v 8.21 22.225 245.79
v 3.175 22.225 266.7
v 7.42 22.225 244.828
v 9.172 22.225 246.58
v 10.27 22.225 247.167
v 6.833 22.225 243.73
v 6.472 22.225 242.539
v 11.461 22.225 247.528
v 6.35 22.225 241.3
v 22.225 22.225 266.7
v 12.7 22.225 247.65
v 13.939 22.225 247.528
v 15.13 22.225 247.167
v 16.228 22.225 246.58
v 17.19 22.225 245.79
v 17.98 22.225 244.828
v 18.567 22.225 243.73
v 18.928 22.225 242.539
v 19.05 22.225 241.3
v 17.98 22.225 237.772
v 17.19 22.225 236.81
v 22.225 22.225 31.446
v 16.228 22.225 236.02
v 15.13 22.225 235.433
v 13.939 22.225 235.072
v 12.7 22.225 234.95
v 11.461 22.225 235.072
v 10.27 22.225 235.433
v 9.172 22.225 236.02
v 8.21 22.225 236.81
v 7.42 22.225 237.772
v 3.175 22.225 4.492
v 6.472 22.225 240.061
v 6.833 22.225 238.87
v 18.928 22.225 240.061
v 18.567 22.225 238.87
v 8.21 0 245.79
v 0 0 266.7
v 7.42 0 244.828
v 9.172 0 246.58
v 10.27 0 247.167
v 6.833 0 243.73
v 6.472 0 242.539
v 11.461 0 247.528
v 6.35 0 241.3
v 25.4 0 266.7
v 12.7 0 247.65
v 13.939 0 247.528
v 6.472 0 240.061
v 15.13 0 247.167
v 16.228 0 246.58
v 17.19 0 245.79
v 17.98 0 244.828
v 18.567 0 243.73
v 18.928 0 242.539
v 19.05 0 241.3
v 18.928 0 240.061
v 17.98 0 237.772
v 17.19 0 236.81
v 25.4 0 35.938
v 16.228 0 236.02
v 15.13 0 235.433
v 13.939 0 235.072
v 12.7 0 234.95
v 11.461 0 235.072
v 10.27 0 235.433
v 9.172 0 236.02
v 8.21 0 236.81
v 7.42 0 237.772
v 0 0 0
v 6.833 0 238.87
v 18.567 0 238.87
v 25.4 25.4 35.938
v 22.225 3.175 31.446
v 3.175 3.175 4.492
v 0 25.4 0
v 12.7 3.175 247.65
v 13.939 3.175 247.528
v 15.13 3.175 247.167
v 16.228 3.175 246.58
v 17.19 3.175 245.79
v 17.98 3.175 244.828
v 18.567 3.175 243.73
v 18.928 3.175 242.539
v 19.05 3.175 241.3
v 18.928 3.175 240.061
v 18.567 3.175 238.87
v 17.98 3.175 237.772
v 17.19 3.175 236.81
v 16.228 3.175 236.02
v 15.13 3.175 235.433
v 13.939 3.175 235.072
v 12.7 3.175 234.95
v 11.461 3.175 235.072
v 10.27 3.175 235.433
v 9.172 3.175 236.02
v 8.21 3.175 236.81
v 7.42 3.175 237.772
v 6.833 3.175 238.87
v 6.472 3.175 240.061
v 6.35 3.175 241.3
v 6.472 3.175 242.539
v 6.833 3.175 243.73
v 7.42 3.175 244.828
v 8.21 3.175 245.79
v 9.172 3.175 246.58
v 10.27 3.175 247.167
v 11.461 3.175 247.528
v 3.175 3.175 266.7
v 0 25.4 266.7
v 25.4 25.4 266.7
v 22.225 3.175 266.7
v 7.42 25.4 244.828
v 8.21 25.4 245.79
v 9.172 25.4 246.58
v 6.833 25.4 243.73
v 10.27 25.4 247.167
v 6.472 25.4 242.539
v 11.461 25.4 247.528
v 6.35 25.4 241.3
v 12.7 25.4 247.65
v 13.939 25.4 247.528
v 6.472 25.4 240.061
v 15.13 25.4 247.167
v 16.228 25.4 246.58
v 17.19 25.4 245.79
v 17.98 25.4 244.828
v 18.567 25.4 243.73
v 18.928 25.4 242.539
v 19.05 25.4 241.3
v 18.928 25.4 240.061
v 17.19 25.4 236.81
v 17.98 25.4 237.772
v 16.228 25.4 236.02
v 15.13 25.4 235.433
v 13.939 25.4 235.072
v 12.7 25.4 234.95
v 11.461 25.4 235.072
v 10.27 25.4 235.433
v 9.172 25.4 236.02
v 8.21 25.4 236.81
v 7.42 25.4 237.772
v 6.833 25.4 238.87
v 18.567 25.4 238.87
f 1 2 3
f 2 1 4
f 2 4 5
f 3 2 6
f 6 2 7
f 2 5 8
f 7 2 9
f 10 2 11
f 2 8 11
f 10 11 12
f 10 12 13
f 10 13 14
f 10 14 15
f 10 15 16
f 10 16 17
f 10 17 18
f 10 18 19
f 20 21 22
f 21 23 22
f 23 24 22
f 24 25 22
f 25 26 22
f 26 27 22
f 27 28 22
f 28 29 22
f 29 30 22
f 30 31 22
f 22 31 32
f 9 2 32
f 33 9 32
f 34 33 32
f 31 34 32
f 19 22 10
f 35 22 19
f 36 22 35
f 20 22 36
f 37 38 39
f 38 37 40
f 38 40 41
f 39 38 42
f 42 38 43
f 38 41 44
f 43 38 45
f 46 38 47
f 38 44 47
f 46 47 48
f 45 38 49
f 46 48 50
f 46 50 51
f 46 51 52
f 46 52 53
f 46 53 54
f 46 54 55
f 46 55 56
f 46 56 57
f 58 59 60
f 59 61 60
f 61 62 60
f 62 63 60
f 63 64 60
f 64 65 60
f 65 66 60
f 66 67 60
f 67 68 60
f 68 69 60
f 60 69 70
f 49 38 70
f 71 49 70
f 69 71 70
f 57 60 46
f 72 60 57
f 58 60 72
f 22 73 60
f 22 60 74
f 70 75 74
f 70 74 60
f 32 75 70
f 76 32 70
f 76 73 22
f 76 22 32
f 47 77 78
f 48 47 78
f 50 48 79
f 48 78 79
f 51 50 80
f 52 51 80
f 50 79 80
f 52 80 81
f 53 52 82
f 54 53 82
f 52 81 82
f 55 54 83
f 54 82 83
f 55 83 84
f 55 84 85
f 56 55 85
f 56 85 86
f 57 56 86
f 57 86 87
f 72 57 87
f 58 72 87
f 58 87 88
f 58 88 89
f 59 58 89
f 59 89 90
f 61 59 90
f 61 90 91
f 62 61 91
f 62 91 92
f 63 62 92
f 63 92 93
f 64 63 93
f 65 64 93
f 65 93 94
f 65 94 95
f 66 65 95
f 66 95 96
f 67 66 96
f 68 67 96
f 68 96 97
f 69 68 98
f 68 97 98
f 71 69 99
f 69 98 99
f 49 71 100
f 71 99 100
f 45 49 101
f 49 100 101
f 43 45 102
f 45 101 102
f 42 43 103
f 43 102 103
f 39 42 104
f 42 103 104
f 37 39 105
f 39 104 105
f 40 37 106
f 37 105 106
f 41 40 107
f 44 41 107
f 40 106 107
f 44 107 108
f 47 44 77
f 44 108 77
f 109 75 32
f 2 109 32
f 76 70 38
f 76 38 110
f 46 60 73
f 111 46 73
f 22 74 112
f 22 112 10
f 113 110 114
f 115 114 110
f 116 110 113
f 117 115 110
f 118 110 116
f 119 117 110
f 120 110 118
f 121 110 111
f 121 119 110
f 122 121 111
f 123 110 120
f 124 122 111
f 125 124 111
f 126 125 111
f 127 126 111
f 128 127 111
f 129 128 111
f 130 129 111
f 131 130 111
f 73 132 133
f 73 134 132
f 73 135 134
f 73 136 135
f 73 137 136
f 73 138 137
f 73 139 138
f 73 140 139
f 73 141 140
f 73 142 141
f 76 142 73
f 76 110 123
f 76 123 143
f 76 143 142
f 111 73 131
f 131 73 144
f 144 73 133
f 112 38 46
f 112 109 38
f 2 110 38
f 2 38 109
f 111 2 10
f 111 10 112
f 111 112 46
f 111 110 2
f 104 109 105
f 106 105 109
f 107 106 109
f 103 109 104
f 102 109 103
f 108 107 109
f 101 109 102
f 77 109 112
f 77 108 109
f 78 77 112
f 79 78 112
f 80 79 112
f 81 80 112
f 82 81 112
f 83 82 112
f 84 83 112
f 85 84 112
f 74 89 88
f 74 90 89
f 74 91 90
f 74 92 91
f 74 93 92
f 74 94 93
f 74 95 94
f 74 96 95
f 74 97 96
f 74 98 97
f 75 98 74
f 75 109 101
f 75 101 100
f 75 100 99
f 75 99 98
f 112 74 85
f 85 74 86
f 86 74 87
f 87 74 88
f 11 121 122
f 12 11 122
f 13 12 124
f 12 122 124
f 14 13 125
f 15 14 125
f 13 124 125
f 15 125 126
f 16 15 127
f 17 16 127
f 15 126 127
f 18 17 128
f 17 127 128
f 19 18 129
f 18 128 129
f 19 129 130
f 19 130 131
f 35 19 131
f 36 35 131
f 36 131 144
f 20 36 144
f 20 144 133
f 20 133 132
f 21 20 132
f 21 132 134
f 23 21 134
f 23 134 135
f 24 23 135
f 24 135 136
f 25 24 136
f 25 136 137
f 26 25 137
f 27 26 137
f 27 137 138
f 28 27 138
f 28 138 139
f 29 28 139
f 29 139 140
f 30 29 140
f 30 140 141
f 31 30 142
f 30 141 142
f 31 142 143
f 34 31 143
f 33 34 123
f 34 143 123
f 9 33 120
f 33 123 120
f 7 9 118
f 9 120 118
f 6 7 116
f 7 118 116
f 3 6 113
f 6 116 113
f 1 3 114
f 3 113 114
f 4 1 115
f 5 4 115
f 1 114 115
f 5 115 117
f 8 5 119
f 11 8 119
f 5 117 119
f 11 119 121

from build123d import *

# Parameters (mm, degrees)
SKETCH1_W           = 25.4
SKETCH1_H           = 25.4
SKETCH1_W_2         = 19.05
SKETCH1_H_2         = 19.05
BOSS_EXTRUDE1_DEPTH = 266.7
CUT_EXTRUDE1_REACH  = 271.108
SKETCH3_R           = 6.35
CUT_EXTRUDE2_DEPTH  = 270.108175275


with BuildPart() as part:
    # Sketch1 → Boss-Extrude1 (new body)
    with BuildSketch(Plane.XY):
        with Locations((12.7, 12.7)):
            Rectangle(SKETCH1_W, SKETCH1_H)
        with Locations((12.7, 12.7)):
            Rectangle(SKETCH1_W_2, SKETCH1_H_2, mode=Mode.SUBTRACT)
    extrude(amount=BOSS_EXTRUDE1_DEPTH)

    # Sketch2 → Cut-Extrude1 (cut, up to next)
    with BuildSketch(Plane(origin=(0, 25.4, 0), x_dir=(1, 0, 0), z_dir=(0, 1, 0)), mode=Mode.PRIVATE) as cut_extrude1_sk1:
        Polygon((25.4, -35.938150335), (0, 0), (25.4, 0), align=None)
    cut_extrude1_tool1 = extrude(cut_extrude1_sk1.sketch, amount=-CUT_EXTRUDE1_REACH, mode=Mode.PRIVATE) & part.part
    add(cut_extrude1_tool1.solids().sort_by_distance((16.933333, 25.4, 11.979383))[0], mode=Mode.SUBTRACT)

    # Sketch3 → Cut-Extrude2 (cut, through all)
    with BuildSketch(Plane(origin=(0, 25.4, 0), x_dir=(1, 0, 0), z_dir=(0, 1, 0))):
        with Locations(Location((12.7, -241.3, 0), (0, 0, 270))):
            Circle(SKETCH3_R)
    extrude(amount=-CUT_EXTRUDE2_DEPTH, mode=Mode.SUBTRACT)


solid = part.part
